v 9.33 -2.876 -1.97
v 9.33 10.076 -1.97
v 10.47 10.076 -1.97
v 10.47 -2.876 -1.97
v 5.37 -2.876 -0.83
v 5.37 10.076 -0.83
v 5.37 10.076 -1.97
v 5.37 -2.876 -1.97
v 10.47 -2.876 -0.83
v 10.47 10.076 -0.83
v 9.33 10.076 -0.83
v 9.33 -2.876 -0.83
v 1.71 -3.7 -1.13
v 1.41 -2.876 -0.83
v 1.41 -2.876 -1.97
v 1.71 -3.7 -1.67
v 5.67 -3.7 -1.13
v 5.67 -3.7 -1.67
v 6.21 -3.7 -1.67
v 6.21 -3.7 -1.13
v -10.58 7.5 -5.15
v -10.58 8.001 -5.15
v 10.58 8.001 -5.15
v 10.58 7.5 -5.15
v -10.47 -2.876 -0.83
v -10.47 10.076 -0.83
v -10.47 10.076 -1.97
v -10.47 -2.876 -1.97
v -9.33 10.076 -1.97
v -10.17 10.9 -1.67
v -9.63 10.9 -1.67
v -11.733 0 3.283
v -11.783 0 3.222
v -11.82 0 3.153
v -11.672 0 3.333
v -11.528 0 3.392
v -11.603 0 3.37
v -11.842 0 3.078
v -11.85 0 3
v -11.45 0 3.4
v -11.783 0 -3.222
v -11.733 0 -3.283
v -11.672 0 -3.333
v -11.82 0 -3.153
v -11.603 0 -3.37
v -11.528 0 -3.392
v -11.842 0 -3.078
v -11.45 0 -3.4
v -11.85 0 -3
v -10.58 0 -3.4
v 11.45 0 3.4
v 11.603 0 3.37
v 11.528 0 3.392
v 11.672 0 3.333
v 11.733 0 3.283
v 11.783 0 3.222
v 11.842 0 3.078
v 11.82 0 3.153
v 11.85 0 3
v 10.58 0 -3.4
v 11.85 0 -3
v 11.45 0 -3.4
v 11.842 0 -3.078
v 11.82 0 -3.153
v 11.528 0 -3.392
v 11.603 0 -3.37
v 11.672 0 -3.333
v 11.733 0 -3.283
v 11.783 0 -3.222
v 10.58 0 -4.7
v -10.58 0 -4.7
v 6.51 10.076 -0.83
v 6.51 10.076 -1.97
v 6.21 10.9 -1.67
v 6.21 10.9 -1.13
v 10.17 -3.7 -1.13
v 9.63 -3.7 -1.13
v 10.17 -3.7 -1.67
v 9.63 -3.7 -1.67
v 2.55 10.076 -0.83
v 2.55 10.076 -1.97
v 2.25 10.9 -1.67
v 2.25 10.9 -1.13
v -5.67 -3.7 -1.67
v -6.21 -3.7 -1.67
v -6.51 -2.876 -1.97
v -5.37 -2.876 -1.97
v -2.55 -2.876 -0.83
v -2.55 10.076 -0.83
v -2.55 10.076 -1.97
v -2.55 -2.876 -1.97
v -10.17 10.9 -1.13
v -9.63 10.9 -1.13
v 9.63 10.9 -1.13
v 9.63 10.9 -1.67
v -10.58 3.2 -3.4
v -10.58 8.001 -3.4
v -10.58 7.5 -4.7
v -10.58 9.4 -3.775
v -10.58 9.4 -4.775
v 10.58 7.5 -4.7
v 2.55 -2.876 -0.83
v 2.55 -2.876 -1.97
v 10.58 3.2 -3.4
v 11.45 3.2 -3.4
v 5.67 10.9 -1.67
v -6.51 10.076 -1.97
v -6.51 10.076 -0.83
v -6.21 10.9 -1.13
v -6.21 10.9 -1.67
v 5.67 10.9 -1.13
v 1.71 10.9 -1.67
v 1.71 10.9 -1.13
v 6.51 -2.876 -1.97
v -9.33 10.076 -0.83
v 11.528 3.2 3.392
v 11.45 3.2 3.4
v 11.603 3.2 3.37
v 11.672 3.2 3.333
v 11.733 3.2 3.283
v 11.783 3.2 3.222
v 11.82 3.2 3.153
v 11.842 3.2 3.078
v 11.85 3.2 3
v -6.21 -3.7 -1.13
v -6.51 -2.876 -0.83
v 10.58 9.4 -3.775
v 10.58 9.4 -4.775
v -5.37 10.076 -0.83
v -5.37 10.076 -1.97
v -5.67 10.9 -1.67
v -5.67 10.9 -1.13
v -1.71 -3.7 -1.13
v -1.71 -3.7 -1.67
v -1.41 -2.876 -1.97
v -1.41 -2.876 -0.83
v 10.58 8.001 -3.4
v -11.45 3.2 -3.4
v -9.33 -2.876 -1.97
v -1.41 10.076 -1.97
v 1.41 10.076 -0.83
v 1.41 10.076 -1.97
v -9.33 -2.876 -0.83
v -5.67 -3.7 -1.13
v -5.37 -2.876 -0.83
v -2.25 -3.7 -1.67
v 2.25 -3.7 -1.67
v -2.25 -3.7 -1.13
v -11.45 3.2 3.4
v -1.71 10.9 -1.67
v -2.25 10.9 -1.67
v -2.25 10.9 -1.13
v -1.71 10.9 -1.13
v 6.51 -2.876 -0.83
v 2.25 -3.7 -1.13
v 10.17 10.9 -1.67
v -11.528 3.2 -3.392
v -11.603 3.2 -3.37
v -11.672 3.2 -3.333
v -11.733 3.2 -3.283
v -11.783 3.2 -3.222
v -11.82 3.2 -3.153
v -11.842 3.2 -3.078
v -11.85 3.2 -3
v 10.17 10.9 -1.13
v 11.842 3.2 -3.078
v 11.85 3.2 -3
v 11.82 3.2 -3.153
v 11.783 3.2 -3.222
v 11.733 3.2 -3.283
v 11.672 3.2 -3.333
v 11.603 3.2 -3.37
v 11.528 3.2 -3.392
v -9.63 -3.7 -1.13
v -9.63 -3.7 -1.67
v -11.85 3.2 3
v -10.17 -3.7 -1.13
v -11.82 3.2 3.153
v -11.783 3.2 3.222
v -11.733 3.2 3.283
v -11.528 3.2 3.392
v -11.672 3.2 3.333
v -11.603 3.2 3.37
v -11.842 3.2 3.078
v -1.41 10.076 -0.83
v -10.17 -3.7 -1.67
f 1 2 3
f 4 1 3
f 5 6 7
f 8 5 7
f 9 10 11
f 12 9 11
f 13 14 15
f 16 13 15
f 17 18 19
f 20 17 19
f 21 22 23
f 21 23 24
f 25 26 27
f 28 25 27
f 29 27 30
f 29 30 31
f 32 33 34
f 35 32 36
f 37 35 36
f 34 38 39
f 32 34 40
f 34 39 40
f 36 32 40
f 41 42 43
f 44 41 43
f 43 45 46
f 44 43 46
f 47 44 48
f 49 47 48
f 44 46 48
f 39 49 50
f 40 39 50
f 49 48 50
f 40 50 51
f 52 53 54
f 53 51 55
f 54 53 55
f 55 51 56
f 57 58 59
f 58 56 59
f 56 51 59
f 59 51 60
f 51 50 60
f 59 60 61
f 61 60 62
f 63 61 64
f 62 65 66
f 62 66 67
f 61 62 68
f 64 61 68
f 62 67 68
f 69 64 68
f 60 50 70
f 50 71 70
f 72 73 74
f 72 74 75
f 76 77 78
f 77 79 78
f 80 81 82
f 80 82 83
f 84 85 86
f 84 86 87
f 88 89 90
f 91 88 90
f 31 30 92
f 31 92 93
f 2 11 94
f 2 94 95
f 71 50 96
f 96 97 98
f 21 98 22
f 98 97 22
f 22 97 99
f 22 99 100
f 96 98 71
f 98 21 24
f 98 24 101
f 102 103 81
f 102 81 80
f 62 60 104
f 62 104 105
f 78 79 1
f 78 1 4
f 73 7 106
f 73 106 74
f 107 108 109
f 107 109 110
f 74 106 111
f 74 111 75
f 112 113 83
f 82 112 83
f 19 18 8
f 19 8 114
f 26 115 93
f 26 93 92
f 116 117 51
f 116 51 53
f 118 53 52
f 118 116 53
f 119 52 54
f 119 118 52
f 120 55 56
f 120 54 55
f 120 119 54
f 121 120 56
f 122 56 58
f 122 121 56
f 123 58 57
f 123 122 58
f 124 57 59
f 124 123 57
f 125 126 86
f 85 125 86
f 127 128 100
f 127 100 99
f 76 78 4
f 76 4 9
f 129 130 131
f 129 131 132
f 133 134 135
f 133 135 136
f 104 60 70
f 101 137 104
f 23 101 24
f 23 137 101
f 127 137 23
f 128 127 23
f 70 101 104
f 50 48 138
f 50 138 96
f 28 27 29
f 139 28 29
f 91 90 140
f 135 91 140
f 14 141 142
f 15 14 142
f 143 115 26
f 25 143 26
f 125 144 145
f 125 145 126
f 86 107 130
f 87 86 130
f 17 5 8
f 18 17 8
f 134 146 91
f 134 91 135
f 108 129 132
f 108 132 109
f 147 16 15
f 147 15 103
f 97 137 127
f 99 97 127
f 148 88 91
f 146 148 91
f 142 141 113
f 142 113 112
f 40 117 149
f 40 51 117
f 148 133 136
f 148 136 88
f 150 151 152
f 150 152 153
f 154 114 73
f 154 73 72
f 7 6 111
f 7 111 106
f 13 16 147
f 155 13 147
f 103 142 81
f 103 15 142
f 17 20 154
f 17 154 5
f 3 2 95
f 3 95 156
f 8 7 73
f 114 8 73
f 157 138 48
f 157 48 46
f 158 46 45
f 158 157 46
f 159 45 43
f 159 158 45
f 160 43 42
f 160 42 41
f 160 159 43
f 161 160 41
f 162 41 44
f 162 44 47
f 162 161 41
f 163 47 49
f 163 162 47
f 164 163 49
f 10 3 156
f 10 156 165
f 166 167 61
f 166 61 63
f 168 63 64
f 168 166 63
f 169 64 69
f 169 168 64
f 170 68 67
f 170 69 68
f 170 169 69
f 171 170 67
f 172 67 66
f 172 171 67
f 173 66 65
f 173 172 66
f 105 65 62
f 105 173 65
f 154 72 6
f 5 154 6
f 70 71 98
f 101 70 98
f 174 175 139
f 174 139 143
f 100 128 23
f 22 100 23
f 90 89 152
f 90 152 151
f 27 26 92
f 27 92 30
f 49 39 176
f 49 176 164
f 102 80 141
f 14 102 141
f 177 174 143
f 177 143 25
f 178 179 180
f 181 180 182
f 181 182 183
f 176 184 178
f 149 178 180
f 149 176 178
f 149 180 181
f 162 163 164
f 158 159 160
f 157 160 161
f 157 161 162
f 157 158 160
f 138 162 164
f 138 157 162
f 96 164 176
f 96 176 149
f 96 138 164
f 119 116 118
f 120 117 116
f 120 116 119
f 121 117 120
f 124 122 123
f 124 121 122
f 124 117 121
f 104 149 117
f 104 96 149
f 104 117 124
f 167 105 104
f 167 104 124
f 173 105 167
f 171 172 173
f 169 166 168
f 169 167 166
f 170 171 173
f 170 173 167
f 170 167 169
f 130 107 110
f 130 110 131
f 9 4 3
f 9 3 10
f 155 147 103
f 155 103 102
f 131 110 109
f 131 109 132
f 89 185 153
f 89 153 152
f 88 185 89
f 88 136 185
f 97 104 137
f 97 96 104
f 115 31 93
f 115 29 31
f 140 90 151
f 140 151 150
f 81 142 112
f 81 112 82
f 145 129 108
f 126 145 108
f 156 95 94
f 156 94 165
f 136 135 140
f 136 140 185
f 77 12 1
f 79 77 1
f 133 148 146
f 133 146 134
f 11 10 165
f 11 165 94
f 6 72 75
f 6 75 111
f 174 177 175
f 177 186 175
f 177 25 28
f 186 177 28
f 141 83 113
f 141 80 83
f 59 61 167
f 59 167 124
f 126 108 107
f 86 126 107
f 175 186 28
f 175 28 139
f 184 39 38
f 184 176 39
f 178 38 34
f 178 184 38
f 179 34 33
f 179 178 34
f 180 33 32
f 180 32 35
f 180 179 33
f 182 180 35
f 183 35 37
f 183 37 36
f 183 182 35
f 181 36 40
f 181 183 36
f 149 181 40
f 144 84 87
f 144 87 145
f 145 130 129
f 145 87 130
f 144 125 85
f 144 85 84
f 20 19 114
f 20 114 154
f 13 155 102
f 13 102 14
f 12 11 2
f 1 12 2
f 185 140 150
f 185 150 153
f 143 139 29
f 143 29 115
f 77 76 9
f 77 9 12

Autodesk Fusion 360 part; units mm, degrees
sketch "Skizze1" plane through (0, 0, 0) normal (0, 1, 0) x (1, 0, 0)
  line L0 (-11.85, 3.4) -> (11.85, 3.4)
  line L1 (11.85, 3.4) -> (11.85, -3.4)
  line L2 (11.85, -3.4) -> (-11.85, -3.4)
  line L3 (-11.85, -3.4) -> (-11.85, 3.4)
  line L4 (0, 3.4) -> (0, -3.4) construction
  dimension "d9" = 23.7
  dimension "d10" = 6.8
extrude "Extrusion1" add sketch "Skizze1" along normal blind 3.2 makes body 1
sketch "Skizze3" plane through (0, 0, 0) normal (1, 0, 0) x (0, 0, -1)
  line L0 (3.4, 0) -> (3.4, 3.2)
  line L1 (3.4, 0) -> (4.7, 0)
  line L2 (4.7, 0) -> (4.7, 9.4)
  line L3 (4.7, 9.4) -> (3.4, 9.4) construction
  line L4 (3.4, 9.4) -> (3.4, 0)
  line L5 (4.7, 9.4) -> (5.15, 9.4)
  line L6 (5.15, 9.4) -> (5.15, 0)
  line L7 (5.15, 0) -> (4.7, 0)
  line L8 (4.7, 0) -> (4.7, 9.4) construction
  line L9 (3.4, 8.0005) -> (3.775, 9.4)
  line L10 (4.775, 9.4) -> (5.15, 8.0005)
  line L11 (5.15, 7.5005) -> (4.7, 7.5005)
  line L12 (4.775, 9.4) -> (3.775, 9.4)
  line L13 (3.775, 9.4) -> (4.775, 9.4) construction
  line L14 (4.775, 9.4) -> (5.15, 9.4) construction
  line L15 (3.775, 9.4) -> (3.4, 9.4) construction
  line L16 (5.15, 9.4) -> (4.775, 9.4) construction
  line L17 (5.15, 8.0005) -> (5.15, 7.5005) construction
  line L18 (5.15, 7.5005) -> (5.15, 8.0005) construction
  line L19 (5.15, 9.4) -> (3.4, 9.4)
  line L20 (5.15, 0) -> (3.4, 0)
  dimension "d31" = 9.4
  dimension "d33" = 1.3
  dimension "d35" = 90
  dimension "d36" = 75
  dimension "d37" = 75
  dimension "d39" = 1
  dimension "d42" = 0.5
  dimension "d48" = 1.75
sketch "Skizze2" plane through (0, 0, 0) normal (0, 1, 0) x (1, 0, 0)
  line L0 (-9.33, 0.83) -> (-10.47, 0.83)
  line L1 (-10.47, 0.83) -> (-10.47, 1.97)
  line L2 (-10.47, 1.97) -> (-9.33, 1.97)
  line L3 (-9.33, 1.97) -> (-9.33, 0.83)
  line L4 (-11.85, 3.4) -> (11.85, 3.4)
  line L5 (11.85, 3.4) -> (11.85, -3.4)
  line L6 (11.85, -3.4) -> (-11.85, -3.4)
  line L7 (-11.85, -3.4) -> (-11.85, 3.4)
  line L8 (0, 3.4) -> (0, 1.4) construction
  line L9 (-9.33, 1.4) -> (-10.47, 1.4) construction
  line L10 (0, 1.4) -> (-9.9, 1.4)
  point P0 (-9.9, 1.4)
  dimension "d16" = 1.14
  dimension "d17" = 1.14
  dimension "d24" = 2
  dimension "d26" = 9.9
extrude "Extrusion3" add sketch "Skizze3" along normal mid plane 21.16 contours L0 L1 L2 L4 L9 L12 L19 L20 | L2 L5 L6 L10 L11 L12 L19 bodies 1
extrude "Extrusion2" add sketch "Skizze2" along normal blind 10.9 and the other way blind 3.7 separate body contours L0 L1 L2 L3 makes body 2
chamfer "Fase2" distance 0.3 angle 70 8 edges at (-9.9, 10.9, -0.83) (-9.33, 10.9, -1.4) (-9.9, 10.9, -1.97) (-10.47, 10.9, -1.4) (-9.33, -3.7, -1.4) (-9.9, -3.7, -0.83) (-10.47, -3.7, -1.4) (-9.9, -3.7, -1.97) measured on face at (-9.71, 10.9, -1.21) measured on face at (-9.71, 10.9, -1.21) measured on face at (-9.71, 10.9, -1.21) measured on face at (-9.71, 10.9, -1.21) measured on face at (-9.71, -3.7, -1.21) measured on face at (-9.71, -3.7, -1.21) measured on face at (-9.71, -3.7, -1.21) measured on face at (-9.71, -3.7, -1.21) on bodies 2
pattern_linear "R-Anordnung1" count 6 spacing 3.96 along (1, 0, 0) of bodies 2 makes body 3 at (-5.37, 1.4414, -1.59) makes body 4 at (-1.41, 1.4414, -1.59) makes body 5 at (2.55, 1.4414, -1.59) makes body 6 at (6.51, 1.4414, -1.59) makes body 7 at (10.47, 1.4414, -1.59)
fillet "Abrundung1" radius 0.4 4 edges at (11.85, 1.6, -3.4) (11.85, 1.6, 3.4) (-11.85, 1.6, 3.4) (-11.85, 1.6, -3.4) on bodies 1
equation "B1 = A1 + ( 1.95 mm * 2 )"
equation "A1 = ( n - 1 ) * P"
equation "C1 = 6.8 mm"
equation "H1 = 9.4 mm"
equation "O1 = 2 mm"
equation "d9 = B1"
equation "d10 = C1"
equation "D1 = 3.2 mm"
equation "Pw = 1.14 mm"
equation "d13 = D1"
equation "d16 = Pw"
equation "d17 = Pw"
equation "LPinTop = 7.7 mm + D1"
equation "LPinBottom = 14.6 mm - LPinTop"
equation "d20 = LPinTop"
equation "d22 = LPinBottom"
equation "d24 = O1"
equation "Pin1XOffset = ( ( n - 1 ) * P ) / 2"
equation "d26 = Pin1XOffset"
equation "d31 = H1"
equation "D2 = 1.3 mm"
equation "d33 = D2"
equation "d35 = alpha"
equation "d36 = 90 deg - beta"
equation "d37 = 90 deg - beta"
equation "Wx1 = 1.0 mm"
equation "Hx1 = 0.5 mm"
equation "alpha = 90 deg"
equation "d42 = Hx1"
equation "beta = 15 deg"
equation "WL1 = 1.27 mm"
equation "d45 = B1 - ( WL1 * 2 )"
equation "Dlatch = 1.75 mm"
equation "d48 = Dlatch"
equation "d54 = delta"
equation "delta = 70 deg"
